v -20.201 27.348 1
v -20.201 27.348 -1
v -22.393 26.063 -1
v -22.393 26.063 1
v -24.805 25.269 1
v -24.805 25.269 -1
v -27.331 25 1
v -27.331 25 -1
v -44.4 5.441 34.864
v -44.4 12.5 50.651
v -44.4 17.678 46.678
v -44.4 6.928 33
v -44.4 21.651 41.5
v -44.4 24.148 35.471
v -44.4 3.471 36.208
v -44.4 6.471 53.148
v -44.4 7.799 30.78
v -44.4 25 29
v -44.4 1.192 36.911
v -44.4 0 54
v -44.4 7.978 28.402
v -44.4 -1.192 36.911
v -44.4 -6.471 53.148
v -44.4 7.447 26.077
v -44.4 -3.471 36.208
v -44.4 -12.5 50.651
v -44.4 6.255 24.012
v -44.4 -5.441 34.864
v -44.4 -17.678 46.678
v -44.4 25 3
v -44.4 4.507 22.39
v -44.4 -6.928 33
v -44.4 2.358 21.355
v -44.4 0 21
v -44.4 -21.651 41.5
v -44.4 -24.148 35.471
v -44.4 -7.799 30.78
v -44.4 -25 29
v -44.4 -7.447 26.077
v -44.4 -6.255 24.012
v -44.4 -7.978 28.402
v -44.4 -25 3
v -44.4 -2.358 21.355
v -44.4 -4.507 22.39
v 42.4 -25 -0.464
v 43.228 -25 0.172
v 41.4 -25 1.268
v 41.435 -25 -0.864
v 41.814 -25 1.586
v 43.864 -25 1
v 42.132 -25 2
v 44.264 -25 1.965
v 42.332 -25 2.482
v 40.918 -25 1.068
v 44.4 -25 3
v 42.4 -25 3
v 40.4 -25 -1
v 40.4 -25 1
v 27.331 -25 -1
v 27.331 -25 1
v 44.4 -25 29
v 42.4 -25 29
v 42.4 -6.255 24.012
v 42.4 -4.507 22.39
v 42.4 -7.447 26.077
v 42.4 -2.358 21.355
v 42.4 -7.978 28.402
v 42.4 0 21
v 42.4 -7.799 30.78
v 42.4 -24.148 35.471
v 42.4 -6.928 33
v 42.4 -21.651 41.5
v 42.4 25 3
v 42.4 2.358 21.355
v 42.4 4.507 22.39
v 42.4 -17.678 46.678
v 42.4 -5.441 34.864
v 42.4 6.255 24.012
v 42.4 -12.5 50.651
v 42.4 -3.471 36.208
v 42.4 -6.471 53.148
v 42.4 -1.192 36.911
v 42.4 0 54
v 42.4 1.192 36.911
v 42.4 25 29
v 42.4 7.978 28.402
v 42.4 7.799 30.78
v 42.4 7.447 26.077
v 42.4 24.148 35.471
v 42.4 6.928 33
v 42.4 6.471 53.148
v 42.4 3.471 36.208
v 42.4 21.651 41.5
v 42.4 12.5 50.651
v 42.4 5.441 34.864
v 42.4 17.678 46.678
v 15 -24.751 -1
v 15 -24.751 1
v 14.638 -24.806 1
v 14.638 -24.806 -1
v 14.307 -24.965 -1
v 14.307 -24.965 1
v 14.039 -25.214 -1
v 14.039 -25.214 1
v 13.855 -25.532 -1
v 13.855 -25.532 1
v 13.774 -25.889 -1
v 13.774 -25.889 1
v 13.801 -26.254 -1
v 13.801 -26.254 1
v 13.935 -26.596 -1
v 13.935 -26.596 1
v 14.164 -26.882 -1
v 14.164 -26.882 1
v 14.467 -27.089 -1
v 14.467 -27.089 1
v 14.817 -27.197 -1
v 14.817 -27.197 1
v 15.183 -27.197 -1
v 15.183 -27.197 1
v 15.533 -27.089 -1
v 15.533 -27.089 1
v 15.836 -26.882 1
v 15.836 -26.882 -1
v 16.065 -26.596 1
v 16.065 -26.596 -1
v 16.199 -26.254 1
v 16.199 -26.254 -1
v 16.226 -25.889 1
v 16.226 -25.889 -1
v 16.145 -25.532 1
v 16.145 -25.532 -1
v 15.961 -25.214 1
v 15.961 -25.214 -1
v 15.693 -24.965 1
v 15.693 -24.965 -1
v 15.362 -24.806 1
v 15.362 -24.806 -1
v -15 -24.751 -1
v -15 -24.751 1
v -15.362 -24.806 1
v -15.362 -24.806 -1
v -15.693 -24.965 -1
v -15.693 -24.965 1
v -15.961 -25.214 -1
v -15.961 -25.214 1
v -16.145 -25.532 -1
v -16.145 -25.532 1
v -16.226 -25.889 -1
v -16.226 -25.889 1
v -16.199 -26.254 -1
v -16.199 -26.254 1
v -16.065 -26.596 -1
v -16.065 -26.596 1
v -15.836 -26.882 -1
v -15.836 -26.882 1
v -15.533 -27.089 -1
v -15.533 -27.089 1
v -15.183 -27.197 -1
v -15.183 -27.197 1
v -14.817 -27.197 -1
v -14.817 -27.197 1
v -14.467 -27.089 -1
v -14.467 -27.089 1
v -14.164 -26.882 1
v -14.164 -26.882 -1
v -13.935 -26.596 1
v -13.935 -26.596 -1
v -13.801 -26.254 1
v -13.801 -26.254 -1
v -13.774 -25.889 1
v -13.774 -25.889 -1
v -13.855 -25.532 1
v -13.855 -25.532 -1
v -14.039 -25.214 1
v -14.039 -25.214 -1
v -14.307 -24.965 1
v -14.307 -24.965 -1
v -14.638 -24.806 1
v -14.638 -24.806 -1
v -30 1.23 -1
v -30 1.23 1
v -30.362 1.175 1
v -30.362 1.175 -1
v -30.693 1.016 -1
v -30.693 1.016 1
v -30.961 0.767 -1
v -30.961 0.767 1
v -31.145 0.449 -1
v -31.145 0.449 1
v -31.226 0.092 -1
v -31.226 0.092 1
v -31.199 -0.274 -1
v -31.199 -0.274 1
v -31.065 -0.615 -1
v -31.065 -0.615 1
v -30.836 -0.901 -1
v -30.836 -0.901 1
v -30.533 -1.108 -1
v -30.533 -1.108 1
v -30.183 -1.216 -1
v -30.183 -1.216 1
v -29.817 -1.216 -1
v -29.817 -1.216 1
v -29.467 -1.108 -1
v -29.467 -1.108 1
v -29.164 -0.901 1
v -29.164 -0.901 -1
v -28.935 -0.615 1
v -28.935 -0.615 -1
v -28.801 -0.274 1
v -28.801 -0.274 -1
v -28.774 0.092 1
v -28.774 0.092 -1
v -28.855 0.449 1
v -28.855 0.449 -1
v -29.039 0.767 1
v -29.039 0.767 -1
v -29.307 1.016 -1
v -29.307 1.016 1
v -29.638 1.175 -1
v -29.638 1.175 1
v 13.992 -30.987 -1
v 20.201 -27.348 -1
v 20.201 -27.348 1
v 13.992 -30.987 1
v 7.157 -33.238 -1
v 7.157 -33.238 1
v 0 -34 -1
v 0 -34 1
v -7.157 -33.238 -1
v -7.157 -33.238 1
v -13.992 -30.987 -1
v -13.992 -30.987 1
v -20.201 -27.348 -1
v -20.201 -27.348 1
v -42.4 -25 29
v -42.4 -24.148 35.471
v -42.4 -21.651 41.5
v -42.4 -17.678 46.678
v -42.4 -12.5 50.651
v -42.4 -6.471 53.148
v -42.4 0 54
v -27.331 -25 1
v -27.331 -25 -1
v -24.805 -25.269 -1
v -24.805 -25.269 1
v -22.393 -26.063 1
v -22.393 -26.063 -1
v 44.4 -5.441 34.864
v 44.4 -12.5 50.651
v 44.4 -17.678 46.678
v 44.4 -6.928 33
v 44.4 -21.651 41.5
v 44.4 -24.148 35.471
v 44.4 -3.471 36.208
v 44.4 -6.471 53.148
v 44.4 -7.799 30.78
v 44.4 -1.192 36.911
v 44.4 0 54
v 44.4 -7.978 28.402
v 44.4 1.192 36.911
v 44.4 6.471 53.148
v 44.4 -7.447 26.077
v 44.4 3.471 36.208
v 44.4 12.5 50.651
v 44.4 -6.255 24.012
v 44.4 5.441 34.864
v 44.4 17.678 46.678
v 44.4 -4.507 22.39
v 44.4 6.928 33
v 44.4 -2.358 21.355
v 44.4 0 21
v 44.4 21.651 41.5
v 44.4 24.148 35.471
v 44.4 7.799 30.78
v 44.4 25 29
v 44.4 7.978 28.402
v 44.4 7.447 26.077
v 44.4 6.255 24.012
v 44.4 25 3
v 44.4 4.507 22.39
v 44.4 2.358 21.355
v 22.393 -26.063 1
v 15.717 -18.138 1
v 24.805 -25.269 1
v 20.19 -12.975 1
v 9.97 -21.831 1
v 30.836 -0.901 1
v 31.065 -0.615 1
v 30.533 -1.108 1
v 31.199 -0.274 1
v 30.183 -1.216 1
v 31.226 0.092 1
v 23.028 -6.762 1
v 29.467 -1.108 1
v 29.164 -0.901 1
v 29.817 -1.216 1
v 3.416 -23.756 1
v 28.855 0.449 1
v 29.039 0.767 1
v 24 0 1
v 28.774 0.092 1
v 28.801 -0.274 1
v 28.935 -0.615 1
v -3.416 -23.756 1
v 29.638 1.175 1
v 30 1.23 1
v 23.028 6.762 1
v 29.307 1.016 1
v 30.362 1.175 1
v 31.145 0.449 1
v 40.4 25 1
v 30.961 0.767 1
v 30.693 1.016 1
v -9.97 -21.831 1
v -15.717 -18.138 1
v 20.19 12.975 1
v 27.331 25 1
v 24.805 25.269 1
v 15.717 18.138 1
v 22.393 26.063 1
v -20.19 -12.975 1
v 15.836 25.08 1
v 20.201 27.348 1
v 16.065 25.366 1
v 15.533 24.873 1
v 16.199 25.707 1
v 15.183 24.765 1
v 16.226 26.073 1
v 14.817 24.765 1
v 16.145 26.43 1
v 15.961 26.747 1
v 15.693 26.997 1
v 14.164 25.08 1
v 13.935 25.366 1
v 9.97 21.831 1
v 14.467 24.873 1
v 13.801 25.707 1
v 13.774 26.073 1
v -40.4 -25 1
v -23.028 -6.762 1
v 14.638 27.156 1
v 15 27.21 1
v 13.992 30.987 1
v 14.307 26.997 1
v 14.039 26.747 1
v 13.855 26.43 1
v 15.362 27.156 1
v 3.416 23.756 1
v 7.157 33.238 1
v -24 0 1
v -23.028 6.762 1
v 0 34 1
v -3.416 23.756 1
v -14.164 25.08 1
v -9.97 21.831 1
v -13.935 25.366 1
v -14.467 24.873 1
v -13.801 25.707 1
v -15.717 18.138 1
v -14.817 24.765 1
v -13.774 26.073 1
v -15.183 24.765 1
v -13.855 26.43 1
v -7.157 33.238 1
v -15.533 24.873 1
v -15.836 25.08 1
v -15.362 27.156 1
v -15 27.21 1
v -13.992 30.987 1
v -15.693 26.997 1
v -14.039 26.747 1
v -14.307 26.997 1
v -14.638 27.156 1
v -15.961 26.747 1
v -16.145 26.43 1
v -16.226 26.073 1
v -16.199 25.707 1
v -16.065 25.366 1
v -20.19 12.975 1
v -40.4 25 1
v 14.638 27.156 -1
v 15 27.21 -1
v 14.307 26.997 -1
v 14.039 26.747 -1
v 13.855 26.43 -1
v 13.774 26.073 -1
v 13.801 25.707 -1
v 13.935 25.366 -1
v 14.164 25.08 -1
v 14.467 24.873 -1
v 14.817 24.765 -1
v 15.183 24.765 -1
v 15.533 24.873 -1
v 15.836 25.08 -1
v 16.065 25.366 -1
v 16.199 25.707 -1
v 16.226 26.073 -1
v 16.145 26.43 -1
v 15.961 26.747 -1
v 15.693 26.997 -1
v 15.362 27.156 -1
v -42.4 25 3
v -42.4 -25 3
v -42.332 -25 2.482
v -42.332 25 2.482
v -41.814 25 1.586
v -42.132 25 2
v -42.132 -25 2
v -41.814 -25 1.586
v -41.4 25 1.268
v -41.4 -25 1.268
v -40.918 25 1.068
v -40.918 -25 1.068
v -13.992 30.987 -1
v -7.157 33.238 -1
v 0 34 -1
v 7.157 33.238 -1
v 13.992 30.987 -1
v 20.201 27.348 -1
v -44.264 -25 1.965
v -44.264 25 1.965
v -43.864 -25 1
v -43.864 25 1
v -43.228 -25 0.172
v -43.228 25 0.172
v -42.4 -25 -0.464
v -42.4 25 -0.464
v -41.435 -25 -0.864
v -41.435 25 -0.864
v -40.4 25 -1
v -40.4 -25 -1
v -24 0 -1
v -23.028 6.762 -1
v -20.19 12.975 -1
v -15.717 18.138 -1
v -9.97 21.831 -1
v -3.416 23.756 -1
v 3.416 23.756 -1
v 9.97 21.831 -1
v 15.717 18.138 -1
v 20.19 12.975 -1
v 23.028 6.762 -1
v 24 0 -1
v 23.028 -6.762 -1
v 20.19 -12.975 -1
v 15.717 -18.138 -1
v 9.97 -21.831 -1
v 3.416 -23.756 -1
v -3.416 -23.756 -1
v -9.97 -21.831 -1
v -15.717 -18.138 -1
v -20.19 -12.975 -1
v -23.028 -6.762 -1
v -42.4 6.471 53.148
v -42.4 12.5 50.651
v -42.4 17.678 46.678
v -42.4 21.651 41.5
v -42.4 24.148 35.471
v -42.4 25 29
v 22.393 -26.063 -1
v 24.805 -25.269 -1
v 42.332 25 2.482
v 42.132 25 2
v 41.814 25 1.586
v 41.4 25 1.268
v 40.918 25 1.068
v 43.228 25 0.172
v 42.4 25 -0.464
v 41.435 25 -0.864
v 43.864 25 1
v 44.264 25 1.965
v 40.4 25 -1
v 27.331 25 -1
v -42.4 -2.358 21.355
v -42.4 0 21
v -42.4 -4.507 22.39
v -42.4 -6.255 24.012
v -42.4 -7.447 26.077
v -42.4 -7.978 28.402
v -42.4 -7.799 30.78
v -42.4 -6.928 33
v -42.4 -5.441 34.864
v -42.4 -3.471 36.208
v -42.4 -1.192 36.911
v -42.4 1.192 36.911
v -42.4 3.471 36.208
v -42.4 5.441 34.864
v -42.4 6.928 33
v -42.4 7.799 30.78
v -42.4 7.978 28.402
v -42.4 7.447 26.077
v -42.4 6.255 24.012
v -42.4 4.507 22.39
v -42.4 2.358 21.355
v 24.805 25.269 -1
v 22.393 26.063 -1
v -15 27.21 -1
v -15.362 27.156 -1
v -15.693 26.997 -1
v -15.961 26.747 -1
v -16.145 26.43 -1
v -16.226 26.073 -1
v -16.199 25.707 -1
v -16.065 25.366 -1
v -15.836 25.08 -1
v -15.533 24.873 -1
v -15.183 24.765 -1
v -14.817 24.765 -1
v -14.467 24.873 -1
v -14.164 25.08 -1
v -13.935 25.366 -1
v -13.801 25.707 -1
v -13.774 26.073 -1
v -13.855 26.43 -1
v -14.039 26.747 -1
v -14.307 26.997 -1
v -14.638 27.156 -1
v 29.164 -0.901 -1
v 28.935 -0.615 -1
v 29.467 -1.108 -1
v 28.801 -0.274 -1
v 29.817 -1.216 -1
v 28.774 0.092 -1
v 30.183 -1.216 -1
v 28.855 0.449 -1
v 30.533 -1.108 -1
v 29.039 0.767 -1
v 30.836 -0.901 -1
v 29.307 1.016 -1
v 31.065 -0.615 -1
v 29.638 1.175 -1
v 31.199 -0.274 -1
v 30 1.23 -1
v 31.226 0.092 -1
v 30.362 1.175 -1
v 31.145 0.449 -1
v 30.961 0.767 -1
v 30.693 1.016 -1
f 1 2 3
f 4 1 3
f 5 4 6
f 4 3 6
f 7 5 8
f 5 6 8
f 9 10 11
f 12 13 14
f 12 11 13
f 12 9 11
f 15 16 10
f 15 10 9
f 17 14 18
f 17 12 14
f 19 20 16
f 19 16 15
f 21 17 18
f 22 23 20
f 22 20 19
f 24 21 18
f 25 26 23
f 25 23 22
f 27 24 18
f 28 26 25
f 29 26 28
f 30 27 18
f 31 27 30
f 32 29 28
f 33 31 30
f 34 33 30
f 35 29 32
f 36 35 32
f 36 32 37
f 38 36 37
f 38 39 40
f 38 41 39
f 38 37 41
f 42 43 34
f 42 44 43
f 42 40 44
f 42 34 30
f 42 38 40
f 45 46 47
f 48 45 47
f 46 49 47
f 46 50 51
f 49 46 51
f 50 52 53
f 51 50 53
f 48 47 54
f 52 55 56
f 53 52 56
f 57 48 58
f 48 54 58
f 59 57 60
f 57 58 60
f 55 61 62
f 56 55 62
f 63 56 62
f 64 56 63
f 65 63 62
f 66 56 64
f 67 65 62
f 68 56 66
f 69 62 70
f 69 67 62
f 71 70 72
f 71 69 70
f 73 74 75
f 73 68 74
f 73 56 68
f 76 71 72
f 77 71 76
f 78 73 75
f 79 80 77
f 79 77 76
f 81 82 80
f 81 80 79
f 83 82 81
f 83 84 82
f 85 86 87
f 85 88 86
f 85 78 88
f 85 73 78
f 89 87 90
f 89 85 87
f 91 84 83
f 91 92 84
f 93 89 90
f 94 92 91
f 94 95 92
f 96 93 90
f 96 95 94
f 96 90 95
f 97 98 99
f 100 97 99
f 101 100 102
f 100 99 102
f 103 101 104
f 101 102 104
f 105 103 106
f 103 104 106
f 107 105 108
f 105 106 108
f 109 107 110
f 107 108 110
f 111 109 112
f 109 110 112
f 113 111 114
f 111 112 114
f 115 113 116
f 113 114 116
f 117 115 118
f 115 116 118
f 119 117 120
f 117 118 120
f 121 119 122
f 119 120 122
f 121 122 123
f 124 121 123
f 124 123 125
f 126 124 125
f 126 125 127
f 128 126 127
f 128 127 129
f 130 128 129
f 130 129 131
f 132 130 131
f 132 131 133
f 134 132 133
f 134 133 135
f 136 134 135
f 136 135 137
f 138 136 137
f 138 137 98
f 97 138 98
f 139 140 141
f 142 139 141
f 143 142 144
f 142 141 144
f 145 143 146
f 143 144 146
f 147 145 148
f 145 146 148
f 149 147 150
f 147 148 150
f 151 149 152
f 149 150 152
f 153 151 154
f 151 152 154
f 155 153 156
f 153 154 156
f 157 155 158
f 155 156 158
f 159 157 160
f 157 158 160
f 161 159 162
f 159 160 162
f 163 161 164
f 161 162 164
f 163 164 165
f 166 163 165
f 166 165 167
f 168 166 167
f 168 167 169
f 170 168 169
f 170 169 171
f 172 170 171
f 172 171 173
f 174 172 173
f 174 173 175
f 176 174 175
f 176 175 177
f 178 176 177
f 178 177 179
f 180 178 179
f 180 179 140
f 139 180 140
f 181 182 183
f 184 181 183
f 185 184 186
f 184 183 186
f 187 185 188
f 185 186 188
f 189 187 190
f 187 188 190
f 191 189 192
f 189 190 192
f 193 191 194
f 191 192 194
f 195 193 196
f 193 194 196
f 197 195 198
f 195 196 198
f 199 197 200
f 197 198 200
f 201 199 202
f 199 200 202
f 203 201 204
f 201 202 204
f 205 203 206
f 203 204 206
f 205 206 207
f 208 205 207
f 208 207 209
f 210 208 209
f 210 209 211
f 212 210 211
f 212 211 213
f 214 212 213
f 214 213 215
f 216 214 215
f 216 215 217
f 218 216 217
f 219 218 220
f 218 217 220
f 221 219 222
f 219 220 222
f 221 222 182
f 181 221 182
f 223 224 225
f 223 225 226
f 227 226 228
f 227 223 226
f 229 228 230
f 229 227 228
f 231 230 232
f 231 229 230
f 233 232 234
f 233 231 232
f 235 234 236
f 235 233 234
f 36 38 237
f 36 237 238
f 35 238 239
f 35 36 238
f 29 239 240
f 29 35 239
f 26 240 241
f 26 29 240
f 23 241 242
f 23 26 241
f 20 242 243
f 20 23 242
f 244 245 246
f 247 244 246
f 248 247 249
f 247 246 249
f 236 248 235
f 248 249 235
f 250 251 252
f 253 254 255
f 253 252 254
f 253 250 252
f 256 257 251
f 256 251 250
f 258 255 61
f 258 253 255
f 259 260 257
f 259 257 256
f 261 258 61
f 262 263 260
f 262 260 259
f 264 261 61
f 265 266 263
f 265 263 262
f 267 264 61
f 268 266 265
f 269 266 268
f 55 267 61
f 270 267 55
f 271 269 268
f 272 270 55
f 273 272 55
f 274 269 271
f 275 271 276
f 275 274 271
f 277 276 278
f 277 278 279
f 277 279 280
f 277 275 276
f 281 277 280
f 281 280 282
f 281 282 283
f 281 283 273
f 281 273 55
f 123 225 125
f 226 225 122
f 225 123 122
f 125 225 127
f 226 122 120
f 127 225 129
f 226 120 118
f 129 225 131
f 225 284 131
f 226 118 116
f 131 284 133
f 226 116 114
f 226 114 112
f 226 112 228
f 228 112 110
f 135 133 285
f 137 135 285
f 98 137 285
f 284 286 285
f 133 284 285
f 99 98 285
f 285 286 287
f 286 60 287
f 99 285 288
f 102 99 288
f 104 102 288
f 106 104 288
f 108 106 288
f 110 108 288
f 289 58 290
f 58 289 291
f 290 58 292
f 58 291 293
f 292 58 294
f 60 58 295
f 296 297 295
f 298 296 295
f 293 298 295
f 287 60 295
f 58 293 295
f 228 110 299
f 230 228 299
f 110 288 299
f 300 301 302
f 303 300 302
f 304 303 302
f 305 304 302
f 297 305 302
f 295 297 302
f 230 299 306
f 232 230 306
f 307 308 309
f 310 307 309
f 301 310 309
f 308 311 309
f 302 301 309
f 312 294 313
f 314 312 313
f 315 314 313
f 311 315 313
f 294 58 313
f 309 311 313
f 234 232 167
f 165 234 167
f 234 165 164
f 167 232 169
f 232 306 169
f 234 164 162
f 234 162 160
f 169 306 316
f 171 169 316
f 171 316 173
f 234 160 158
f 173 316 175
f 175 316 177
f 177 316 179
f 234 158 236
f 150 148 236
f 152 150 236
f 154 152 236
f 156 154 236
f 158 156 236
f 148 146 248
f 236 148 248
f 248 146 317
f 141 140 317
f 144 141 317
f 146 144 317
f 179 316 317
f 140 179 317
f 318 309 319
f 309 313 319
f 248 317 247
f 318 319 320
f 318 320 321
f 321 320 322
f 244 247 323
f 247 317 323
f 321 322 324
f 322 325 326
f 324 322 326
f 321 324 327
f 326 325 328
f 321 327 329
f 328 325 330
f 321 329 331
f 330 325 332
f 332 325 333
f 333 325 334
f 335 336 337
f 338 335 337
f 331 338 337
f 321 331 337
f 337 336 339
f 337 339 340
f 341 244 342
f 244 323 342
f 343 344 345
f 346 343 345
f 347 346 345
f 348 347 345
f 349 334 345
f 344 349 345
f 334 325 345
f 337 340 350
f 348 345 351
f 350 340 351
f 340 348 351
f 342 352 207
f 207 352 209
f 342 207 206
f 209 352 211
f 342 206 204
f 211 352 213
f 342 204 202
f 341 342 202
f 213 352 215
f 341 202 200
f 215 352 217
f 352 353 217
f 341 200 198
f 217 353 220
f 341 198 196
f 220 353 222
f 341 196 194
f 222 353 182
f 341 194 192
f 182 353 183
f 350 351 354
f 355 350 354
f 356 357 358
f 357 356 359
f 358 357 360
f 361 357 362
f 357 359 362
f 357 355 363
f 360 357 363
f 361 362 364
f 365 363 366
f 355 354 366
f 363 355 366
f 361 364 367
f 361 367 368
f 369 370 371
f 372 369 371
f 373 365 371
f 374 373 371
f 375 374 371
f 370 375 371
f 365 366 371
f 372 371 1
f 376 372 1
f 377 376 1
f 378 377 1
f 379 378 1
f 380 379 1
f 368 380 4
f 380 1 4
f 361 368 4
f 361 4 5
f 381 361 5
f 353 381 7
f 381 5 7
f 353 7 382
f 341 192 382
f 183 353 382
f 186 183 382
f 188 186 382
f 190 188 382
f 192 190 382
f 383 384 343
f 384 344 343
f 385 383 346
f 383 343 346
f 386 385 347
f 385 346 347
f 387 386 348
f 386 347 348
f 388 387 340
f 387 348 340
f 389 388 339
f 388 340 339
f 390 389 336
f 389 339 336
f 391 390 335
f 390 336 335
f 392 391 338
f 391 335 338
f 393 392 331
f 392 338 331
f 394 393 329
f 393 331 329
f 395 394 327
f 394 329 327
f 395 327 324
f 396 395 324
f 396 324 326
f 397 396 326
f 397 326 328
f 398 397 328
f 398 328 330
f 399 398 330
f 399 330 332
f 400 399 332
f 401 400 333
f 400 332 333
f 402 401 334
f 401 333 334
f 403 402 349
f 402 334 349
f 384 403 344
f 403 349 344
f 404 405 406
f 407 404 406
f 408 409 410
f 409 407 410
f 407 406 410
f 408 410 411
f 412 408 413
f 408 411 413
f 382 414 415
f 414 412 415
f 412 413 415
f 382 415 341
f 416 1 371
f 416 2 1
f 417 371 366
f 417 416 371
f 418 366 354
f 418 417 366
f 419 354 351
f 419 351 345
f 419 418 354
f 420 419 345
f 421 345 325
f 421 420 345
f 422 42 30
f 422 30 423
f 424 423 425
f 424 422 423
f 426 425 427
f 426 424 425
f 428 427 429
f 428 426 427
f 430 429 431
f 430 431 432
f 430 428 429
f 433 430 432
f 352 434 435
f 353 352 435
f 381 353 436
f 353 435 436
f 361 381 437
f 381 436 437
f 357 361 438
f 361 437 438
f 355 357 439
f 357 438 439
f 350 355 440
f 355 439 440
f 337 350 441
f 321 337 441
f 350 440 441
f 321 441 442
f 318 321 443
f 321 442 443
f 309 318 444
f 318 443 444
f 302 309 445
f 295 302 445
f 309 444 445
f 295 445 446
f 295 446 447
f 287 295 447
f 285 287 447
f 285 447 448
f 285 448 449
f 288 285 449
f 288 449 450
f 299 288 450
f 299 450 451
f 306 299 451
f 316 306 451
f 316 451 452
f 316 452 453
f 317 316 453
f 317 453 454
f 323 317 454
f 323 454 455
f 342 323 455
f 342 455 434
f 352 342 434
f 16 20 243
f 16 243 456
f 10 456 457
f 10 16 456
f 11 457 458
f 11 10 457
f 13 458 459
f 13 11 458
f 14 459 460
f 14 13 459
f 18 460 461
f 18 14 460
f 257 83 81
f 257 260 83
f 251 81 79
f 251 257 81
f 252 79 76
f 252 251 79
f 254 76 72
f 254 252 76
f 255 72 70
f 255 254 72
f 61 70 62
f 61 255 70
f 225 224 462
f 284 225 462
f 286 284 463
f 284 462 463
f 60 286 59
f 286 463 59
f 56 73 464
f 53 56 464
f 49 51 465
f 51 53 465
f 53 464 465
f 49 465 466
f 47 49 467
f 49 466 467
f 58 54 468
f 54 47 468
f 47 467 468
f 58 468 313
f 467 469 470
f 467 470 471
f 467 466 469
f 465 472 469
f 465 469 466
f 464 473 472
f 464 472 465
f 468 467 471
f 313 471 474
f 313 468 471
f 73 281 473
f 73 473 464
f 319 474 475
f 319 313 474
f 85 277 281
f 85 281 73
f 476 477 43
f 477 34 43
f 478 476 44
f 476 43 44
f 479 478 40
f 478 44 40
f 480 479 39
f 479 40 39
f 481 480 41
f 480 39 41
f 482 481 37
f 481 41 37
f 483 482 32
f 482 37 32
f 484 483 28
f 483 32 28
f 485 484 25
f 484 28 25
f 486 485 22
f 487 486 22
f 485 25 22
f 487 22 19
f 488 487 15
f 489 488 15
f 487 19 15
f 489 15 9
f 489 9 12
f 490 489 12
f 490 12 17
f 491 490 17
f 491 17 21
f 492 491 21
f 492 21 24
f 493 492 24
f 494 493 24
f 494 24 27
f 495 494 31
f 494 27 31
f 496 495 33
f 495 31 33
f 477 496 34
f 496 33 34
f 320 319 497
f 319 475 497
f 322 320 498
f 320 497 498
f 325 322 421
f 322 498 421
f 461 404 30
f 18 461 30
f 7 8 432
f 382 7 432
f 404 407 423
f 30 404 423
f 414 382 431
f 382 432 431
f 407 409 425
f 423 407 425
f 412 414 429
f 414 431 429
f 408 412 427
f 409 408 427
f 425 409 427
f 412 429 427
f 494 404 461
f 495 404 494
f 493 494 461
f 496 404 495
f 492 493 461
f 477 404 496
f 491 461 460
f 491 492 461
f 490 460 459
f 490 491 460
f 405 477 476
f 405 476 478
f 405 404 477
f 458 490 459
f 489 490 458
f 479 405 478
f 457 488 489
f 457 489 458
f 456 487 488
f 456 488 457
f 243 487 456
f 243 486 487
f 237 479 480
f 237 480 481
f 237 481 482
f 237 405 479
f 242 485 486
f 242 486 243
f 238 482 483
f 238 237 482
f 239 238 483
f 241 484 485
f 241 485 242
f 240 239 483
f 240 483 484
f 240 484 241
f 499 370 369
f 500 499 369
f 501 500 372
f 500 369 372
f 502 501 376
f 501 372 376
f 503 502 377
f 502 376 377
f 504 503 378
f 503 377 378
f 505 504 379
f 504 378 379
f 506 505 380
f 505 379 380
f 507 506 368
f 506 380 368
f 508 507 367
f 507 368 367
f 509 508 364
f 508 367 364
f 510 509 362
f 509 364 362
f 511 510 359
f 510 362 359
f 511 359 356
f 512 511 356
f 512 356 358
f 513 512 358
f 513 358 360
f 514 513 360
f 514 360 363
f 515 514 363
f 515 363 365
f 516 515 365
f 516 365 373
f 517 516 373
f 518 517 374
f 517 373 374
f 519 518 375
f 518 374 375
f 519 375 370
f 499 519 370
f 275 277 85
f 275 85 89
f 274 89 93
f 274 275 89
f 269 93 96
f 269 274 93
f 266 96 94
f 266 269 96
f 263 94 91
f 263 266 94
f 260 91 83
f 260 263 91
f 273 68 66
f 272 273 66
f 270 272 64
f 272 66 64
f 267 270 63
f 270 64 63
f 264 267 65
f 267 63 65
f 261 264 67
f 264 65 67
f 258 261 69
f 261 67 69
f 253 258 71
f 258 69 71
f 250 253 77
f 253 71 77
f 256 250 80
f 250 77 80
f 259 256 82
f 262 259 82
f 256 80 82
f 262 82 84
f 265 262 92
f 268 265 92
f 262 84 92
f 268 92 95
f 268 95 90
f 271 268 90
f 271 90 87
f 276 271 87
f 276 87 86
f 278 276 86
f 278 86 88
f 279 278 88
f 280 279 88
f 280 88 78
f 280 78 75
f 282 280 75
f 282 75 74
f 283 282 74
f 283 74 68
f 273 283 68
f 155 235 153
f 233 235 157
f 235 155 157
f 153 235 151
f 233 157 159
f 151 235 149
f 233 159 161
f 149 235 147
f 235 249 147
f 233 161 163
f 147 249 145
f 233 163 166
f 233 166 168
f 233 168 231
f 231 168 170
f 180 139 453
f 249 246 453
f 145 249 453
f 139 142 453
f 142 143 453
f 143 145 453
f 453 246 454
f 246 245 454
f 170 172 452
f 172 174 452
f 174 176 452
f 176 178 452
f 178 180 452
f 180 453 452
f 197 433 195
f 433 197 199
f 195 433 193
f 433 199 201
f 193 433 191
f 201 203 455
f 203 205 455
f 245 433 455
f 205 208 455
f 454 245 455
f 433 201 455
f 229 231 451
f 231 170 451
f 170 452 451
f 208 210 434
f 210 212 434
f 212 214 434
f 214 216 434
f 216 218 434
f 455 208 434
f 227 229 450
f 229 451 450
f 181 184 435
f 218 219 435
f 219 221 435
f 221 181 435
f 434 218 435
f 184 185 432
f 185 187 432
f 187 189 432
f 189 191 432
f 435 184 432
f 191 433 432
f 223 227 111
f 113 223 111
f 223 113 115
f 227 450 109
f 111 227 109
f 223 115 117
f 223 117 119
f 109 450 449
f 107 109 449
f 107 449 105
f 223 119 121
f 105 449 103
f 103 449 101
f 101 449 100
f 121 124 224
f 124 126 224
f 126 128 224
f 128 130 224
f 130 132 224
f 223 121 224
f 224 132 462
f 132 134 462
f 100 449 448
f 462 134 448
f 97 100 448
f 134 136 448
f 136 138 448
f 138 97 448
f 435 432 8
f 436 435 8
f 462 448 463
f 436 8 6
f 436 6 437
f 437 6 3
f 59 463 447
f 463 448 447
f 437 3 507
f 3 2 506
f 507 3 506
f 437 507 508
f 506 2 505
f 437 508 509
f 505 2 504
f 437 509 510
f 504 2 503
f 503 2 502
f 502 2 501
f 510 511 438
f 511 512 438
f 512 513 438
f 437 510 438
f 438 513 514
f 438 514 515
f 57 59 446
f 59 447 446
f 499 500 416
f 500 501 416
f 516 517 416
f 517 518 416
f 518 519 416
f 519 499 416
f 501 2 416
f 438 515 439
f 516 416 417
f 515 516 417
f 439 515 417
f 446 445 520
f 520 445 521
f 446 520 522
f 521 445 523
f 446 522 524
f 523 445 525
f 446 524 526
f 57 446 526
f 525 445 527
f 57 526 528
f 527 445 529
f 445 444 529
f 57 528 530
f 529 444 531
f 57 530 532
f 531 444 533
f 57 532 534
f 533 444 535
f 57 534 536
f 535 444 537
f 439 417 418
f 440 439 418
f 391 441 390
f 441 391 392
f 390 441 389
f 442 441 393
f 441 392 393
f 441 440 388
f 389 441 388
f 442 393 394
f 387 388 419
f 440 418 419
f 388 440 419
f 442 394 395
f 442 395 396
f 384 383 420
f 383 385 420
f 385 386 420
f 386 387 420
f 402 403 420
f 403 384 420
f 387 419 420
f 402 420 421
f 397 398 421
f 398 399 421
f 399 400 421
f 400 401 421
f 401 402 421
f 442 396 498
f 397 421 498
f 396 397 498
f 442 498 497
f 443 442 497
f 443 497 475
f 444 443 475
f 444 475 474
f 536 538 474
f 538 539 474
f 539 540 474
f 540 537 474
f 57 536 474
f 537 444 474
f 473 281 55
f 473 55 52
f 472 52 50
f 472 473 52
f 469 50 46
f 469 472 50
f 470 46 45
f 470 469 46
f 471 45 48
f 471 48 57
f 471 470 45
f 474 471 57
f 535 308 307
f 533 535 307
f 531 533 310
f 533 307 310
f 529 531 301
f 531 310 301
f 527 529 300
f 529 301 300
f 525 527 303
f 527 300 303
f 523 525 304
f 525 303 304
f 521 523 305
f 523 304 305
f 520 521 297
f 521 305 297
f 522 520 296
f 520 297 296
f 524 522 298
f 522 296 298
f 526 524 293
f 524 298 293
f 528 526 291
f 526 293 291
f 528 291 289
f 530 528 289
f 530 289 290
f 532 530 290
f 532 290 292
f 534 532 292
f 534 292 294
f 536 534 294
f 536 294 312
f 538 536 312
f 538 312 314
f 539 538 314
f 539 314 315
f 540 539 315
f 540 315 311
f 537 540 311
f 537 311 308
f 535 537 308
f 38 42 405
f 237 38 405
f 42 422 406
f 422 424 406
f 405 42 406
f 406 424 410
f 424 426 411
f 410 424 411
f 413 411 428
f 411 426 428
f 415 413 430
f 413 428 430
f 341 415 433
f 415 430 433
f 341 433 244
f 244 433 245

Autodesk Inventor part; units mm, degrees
ref_plane "YZ Plane" through (0, 0, 0) normal (1, 0, 0) x (0, 1, 0)
ref_plane "XZ Plane" through (0, 0, 0) normal (0, 1, 0) x (-1, 0, 0)
ref_plane "XY Plane" through (0, 0, 0) normal (0, 0, 1) x (1, 0, 0)
sketch "スケッチ1" plane through (0, 0, 0) normal (0, 0, 1) x (1, 0, 0)
  line L0 (44.4, 25) -> (-44.4, 25)
  line L1 (-44.4, 25) -> (-44.4, -25)
  line L2 (-44.4, -25) -> (44.4, -25)
  line L3 (44.4, -25) -> (44.4, 25)
  line L4 (44.4, 25) -> (-44.4, -25) construction
  line L5 (-44.4, 25) -> (44.4, -25) construction
  point P0 (0, 0)
  dimension "d0" = 50
  dimension "d1" = 88.8
extrude "プレート1" add sketch "スケッチ1" along normal mid plane 2
sketch "スケッチ6" plane through (0, 0, -1) normal (0, 0, -1) x (-1, 0, 0)
  circle A0 centre (0, 0) radius 34
  dimension "d48" = 68
extrude "押し出し2" add sketch "スケッチ6" against normal up to surface (2 mm away)
sketch "スケッチ2" plane through (42.4, 25, -1) normal (1, 0, 0) x (0, 1, 0)
  line L0 (-50, 0) -> (0, 0)
  line L1 (0, 0) -> (0, 55)
  line L2 (0, 55) -> (-50, 55)
  line L3 (-50, 55) -> (-50, 0)
edge flange "フランジ1" height 55 angle 90 thickness 2 bend radius 2 thickness toward (1, 0, 0) relief tear relief width 2 relief depth 1 corner gap 2 corner form 0 edges at (44.4, 0, 1) (-44.4, 0, 1) wall of the first edge with corners at (42.4, -25, -1) (42.4, 25, -1) (42.4, 25, 54) (42.4, -25, 54)
bend "曲げ1"
corner "コーナー1"
fillet "フィレット1" radius 25 4 edges at (43.4, 25, 54) (-43.4, 25, 54) (-43.4, -25, 54) (43.4, -25, 54)
sketch "スケッチ3" plane through (44.4, -25, 3) normal (1, 0, 0) x (0, 0, -1)
  arc A0 (-26, 50) -> (-26, 0) centre (-26, 25) ccw projected
  point P0 (3, 25)
  point P1 (-26, 25)
  point P2 (-38, 25)
  point P3 (-26, 13)
  point P4 (-14, 25)
  point P5 (-26, 37)
  dimension "d24" = 360
  dimension "d52" = 12
hole "穴1" at (44.4, 0, 29) direction (-1, 0, 0) diameter 16 end through all
sketch "スケッチ4" plane through (0, 0, -1) normal (0, 0, -1) x (-1, 0, 0)
  circle A0 centre (0, 0) radius 24
  dimension "d33" = 48
extrude "押し出し1" cut sketch "スケッチ4" against normal through all
sketch "スケッチ5" plane through (0, 0, -1) normal (0, 0, -1) x (-1, 0, 0)
  point P0 (0, 0)
  point P1 (-30, 0)
  point P2 (-15, -25.9808)
  point P3 (15, -25.9808)
  point P4 (30, 0)
  point P5 (15, 25.9808)
  point P6 (-15, 25.9808)
  dimension "d36" = 30
  dimension "d39" = 360
hole "穴3" at (30, 0, -1) at (15, -25.9808, -1) at (-15, -25.9808, -1) at (-30, 0, -1) at (-15, 25.9808, -1) at (15, 25.9808, -1) direction (0, 0, 1) diameter 2.459 end through all thread size "M3x0.5" class "6H" standard "ANSI Metric M Profile"
fillet "コーナーR1" radius 12 4 edges at (23.0434, 25, 0) (-23.0434, 25, 0) (23.0434, -25, 0) (-23.0434, -25, 0)
equation "\"d13\" = 0.5 * d0"
equation "\"d46\" = Thickness"
equation "\"d2\" = Thickness"
equation "\"d3\" = BendReliefWidth"
equation "\"d4\" = BendReliefDepth"
equation "\"d5\" = MinimumRemnant"
equation "\"d6\" = TransitionRadius"
equation "\"d9\" = BendRadius"
equation "\"d10\" = CornerReliefSize"
equation "\"d11\" = GapSize"
equation "\"d12\" = JacobiRadiusSize"
equation "\"BendRadius\" = Thickness"
equation "\"BendReliefWidth\" = Thickness"
equation "\"BendReliefDepth\" = 0.5 * Thickness"
equation "\"CornerReliefSize\" = 4 * Thickness"
equation "\"MinimumRemnant\" = 2 * Thickness"
equation "\"TransitionRadius\" = BendRadius"
equation "\"JacobiRadiusSize\" = BendRadius"
equation "\"GapSize\" = Thickness"
equation "\"Thickness\" = 2"
properties part number "edge_j4-5" material "アルミニウム 6061"
